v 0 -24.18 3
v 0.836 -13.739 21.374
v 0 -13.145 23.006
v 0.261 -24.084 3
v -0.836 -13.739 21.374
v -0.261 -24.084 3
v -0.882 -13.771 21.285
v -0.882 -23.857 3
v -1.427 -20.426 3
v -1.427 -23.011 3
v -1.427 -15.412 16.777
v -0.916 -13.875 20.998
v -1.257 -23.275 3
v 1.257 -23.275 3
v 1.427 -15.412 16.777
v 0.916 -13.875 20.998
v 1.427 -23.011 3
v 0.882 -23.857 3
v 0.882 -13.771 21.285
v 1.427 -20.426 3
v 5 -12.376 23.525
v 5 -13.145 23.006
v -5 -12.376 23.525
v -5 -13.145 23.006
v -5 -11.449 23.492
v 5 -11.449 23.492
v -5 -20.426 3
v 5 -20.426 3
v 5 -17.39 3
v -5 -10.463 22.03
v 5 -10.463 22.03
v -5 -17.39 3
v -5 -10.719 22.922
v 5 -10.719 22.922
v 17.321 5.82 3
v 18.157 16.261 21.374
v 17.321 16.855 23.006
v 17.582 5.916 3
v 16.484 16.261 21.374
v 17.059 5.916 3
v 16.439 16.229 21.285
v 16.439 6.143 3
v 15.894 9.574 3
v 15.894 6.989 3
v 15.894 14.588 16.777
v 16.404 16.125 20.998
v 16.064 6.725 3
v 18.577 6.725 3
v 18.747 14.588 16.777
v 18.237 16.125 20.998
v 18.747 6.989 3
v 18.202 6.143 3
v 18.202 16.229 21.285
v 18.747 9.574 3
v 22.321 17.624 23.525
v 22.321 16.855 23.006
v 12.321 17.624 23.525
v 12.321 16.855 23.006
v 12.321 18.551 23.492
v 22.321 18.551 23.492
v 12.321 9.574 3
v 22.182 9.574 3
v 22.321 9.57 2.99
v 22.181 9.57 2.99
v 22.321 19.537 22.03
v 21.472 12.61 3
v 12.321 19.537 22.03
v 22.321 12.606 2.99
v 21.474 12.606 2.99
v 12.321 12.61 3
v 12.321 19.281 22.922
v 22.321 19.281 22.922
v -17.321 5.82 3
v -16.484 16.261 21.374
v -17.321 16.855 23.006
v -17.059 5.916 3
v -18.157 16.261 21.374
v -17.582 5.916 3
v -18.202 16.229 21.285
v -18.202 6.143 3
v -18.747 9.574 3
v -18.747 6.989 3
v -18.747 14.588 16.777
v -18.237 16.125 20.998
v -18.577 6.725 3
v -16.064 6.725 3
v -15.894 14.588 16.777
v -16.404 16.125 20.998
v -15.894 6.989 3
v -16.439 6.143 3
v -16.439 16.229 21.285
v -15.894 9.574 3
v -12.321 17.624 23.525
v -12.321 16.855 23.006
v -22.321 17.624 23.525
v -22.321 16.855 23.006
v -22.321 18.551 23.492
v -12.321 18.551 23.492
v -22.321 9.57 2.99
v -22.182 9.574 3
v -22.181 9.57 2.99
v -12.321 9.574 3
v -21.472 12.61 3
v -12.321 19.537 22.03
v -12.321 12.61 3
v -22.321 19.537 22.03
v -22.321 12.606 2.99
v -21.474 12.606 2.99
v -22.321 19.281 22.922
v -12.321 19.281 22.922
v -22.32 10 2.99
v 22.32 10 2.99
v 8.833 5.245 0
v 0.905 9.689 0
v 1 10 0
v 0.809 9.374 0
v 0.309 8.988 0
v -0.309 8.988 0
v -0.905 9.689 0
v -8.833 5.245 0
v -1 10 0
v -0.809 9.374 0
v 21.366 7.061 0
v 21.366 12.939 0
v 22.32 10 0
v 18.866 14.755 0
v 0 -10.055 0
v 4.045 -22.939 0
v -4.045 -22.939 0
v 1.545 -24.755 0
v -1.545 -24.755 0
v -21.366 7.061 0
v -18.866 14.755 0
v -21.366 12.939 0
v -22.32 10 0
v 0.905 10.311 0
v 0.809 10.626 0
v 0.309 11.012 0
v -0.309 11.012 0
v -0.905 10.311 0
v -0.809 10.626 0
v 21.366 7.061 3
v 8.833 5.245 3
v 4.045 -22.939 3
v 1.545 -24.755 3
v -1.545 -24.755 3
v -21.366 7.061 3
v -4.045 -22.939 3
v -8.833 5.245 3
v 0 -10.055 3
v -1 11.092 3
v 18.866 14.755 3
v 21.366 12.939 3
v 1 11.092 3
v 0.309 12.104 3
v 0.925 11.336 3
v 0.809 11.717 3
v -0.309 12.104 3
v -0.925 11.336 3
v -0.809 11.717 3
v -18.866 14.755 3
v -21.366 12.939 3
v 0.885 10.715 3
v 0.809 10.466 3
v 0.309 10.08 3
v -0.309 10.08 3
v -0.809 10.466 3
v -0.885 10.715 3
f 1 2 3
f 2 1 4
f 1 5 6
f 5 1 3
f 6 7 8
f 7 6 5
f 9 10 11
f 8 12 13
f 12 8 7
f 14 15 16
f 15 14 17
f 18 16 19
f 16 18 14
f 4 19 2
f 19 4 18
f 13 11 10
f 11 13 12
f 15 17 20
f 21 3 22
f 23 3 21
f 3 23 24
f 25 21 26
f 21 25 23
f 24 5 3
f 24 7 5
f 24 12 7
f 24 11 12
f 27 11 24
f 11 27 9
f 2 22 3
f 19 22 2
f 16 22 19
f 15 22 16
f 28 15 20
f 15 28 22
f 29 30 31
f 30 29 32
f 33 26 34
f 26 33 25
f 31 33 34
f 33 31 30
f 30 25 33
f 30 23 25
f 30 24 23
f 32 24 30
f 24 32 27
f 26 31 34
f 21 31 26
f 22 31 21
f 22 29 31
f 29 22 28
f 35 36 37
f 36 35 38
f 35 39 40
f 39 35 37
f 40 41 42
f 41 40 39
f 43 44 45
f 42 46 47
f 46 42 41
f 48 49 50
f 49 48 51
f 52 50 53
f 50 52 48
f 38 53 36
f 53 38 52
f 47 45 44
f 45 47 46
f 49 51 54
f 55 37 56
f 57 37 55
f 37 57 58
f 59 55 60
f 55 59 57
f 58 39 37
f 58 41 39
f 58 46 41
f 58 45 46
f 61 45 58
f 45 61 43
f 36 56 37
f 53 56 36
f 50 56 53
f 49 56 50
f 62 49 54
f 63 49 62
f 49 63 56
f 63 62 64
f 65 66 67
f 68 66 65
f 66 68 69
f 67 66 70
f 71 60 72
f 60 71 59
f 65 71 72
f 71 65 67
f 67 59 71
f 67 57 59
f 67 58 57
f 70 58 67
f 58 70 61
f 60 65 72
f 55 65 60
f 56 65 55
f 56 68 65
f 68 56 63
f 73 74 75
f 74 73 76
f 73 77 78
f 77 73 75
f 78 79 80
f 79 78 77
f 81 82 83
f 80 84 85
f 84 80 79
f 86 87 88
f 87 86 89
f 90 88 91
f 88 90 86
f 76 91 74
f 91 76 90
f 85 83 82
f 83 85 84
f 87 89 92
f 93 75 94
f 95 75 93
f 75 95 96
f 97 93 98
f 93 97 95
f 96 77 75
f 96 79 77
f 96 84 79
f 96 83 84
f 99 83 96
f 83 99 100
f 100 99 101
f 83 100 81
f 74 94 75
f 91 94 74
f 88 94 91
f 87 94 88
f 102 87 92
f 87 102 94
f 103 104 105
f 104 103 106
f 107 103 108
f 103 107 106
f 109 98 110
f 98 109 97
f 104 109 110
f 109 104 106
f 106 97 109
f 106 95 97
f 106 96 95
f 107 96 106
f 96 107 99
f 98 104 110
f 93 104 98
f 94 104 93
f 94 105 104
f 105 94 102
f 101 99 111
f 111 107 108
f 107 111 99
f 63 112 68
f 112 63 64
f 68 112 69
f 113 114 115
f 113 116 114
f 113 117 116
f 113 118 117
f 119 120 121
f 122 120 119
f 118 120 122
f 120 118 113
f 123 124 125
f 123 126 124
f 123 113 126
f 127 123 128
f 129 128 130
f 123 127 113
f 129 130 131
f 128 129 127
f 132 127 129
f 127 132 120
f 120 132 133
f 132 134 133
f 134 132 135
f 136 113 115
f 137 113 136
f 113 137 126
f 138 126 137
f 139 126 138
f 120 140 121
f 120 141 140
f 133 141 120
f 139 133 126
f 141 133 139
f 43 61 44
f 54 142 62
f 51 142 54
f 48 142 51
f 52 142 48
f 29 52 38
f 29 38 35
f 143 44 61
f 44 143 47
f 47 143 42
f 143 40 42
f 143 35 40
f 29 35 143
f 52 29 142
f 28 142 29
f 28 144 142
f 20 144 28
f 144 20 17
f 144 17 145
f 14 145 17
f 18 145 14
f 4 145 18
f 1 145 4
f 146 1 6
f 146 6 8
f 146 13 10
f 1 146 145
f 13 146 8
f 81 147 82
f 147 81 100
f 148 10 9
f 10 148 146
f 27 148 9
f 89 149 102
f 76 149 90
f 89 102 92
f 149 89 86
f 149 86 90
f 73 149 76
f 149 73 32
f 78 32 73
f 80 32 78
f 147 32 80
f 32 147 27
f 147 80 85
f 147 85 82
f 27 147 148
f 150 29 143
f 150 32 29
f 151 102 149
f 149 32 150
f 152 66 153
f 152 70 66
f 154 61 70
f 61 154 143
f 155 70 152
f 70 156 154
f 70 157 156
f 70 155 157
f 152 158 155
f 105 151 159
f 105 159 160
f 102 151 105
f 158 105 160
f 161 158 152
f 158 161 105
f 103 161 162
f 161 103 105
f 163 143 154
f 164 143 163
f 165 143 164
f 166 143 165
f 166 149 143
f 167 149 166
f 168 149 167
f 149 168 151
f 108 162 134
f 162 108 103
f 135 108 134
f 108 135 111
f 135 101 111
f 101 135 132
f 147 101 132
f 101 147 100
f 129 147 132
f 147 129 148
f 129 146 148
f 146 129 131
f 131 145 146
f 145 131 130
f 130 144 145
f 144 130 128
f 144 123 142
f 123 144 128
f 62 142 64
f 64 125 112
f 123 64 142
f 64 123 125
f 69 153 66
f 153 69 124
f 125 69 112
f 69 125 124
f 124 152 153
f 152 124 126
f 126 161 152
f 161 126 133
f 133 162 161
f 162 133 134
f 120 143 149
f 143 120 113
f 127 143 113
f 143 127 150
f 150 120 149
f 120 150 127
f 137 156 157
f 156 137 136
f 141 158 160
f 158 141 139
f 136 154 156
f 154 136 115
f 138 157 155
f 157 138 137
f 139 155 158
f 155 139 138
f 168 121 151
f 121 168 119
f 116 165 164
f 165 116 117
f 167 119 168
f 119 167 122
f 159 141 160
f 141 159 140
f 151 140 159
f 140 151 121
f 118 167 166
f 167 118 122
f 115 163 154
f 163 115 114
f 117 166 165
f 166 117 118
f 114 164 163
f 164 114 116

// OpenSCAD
radius = 20;
numberOfHooks = 3;
width = 10;
thickness = 3;
hookLength = 22;
hookAngle = 70;
supportRatio = 0.5;
nailHoleDiameter = 2;
nailHoleAngle = 70;

module dummy() {}

$fn = 10;

innerRadius = radius * cos(180/numberOfHooks);

nudge = 0.01;

points = [for (i=[0:numberOfHooks-1]) let(a=270+i*360/numberOfHooks) radius*[cos(a),sin(a)]];

module base() 
{
    linear_extrude(height=thickness)     
    for (i=[0:numberOfHooks-1]) {
        hull() {
            translate(points[i]) circle(d=width);
            translate(points[(i+1)%numberOfHooks]) circle(d=width);
        }
    }
}

module hook()
{
    rotate([0,0,180])
    rotate([90-hookAngle,0,0])
    translate([-width/2,0,thickness/2]) 
    rotate([0,0,180])
    rotate([0,-90,0]) {    
        hull() {
            translate([-width,-width*supportRatio,width/2])
            sphere(d=thickness);
            translate([hookLength,0,width/2]) sphere(d=thickness);
            translate([0,0,width/2]) sphere(d=thickness);
        }
        
        hull() {
            cylinder(d=thickness,h=width);
            translate([hookLength,0,0]) cylinder(d=thickness,h=width);
        }
    }
}

module hooks() {
    render(convexity=2)
    intersection() {
        union() {
            for (i=[0:numberOfHooks-1]) translate(points[i]) hook();
        }
        translate([0,0,thickness-nudge])
        cylinder(r=10*radius,h=thickness+hookLength, $fn=4);
    }
}

module nailHole() {
    rotate([nailHoleAngle-90,0,0])
    translate([0,0,-thickness*5]) cylinder(h=thickness*10,d=nailHoleDiameter);
}

hooks();
render(convexity=2)
difference() {
    base();
    if (numberOfHooks % 2 == 1) {
        translate([0,innerRadius,0]) nailHole();
    }
    else {
        translate(innerRadius*[cos(90+180/numberOfHooks),sin(90+180/numberOfHooks)]) nailHole();
        translate(innerRadius*[-cos(90+180/numberOfHooks),sin(90+180/numberOfHooks)]) nailHole();
    }
}
